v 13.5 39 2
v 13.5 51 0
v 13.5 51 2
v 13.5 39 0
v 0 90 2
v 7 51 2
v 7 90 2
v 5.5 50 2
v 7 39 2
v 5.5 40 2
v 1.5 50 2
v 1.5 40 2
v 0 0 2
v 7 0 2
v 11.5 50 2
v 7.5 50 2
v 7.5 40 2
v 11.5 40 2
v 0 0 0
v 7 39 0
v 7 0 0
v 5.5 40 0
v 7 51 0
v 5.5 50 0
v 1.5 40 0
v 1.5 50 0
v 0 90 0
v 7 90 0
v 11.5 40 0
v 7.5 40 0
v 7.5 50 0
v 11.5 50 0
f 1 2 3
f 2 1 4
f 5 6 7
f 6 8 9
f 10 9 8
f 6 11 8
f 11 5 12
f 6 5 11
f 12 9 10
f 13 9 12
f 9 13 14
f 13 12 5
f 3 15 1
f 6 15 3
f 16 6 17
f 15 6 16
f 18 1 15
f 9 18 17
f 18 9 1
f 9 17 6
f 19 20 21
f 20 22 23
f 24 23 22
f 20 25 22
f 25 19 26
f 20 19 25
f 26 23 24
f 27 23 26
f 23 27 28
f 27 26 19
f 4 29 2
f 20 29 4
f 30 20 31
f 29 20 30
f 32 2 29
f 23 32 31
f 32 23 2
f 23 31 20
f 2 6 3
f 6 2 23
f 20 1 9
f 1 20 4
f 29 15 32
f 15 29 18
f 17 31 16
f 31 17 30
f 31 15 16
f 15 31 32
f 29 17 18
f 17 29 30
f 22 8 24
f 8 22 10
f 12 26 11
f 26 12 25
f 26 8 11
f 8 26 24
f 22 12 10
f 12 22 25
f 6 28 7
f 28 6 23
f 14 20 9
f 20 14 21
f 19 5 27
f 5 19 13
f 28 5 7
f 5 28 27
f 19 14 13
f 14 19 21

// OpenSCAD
//set global paramaeters
// Base polygon
base_width = 7;
base_length = 90;
base_depth = 2;

// Inset distance
inset_width = 13;
inset_length = 12;
inset_depth = base_depth;

//tidycuts
tidycut_width = inset_width /3.25;
tidycut_height = inset_length -2;
tidycut_depth = base_depth*4;

//tidycut variable
cut_adjuster = 1; // Move the cut left and right
cut_inset_1 = 5; // Move the top hole down
cut_inset_2 = 11; // Move the Bottom hole up

//define modules
//base cube module
module base_square (){
      cube(
        [base_width,
         base_length,
         base_depth]
        );
    }

//Inset square module    
module inset_square(){
        cube(
            [inset_width,
             inset_length,
             inset_depth]
            );
}

//Subtractive Square module
module subtractive_square(){
        cube(
            [
            tidycut_width,
            tidycut_height,
            tidycut_depth
            ]
            );
    }

//render objects
//render the base cube
//base_square();

difference(){
// Render the inset square
translate([base_width- inset_width/2, base_length / 2 - inset_length/2, 0]) inset_square();

//subtract the inset square and base cube with 2 subtracctive squares
    //cut 1
      translate([base_width- inset_width/2 + (inset_length - cut_inset_1), 
    (base_length / 2 - inset_length/2)+cut_adjuster, 
    -1])
          subtractive_square();
    //cut 2
       translate([base_width- inset_width/2 + (inset_length-cut_inset_2), 
    (base_length / 2 - inset_length/2)+cut_adjuster, 
    -1])
    subtractive_square();
};


difference(){
    base_square();
    
     //cut 2
       translate([base_width- inset_width/2 + (inset_length-cut_inset_2), 
    (base_length / 2 - inset_length/2)+cut_adjuster, 
    -1])
    subtractive_square();
    }
